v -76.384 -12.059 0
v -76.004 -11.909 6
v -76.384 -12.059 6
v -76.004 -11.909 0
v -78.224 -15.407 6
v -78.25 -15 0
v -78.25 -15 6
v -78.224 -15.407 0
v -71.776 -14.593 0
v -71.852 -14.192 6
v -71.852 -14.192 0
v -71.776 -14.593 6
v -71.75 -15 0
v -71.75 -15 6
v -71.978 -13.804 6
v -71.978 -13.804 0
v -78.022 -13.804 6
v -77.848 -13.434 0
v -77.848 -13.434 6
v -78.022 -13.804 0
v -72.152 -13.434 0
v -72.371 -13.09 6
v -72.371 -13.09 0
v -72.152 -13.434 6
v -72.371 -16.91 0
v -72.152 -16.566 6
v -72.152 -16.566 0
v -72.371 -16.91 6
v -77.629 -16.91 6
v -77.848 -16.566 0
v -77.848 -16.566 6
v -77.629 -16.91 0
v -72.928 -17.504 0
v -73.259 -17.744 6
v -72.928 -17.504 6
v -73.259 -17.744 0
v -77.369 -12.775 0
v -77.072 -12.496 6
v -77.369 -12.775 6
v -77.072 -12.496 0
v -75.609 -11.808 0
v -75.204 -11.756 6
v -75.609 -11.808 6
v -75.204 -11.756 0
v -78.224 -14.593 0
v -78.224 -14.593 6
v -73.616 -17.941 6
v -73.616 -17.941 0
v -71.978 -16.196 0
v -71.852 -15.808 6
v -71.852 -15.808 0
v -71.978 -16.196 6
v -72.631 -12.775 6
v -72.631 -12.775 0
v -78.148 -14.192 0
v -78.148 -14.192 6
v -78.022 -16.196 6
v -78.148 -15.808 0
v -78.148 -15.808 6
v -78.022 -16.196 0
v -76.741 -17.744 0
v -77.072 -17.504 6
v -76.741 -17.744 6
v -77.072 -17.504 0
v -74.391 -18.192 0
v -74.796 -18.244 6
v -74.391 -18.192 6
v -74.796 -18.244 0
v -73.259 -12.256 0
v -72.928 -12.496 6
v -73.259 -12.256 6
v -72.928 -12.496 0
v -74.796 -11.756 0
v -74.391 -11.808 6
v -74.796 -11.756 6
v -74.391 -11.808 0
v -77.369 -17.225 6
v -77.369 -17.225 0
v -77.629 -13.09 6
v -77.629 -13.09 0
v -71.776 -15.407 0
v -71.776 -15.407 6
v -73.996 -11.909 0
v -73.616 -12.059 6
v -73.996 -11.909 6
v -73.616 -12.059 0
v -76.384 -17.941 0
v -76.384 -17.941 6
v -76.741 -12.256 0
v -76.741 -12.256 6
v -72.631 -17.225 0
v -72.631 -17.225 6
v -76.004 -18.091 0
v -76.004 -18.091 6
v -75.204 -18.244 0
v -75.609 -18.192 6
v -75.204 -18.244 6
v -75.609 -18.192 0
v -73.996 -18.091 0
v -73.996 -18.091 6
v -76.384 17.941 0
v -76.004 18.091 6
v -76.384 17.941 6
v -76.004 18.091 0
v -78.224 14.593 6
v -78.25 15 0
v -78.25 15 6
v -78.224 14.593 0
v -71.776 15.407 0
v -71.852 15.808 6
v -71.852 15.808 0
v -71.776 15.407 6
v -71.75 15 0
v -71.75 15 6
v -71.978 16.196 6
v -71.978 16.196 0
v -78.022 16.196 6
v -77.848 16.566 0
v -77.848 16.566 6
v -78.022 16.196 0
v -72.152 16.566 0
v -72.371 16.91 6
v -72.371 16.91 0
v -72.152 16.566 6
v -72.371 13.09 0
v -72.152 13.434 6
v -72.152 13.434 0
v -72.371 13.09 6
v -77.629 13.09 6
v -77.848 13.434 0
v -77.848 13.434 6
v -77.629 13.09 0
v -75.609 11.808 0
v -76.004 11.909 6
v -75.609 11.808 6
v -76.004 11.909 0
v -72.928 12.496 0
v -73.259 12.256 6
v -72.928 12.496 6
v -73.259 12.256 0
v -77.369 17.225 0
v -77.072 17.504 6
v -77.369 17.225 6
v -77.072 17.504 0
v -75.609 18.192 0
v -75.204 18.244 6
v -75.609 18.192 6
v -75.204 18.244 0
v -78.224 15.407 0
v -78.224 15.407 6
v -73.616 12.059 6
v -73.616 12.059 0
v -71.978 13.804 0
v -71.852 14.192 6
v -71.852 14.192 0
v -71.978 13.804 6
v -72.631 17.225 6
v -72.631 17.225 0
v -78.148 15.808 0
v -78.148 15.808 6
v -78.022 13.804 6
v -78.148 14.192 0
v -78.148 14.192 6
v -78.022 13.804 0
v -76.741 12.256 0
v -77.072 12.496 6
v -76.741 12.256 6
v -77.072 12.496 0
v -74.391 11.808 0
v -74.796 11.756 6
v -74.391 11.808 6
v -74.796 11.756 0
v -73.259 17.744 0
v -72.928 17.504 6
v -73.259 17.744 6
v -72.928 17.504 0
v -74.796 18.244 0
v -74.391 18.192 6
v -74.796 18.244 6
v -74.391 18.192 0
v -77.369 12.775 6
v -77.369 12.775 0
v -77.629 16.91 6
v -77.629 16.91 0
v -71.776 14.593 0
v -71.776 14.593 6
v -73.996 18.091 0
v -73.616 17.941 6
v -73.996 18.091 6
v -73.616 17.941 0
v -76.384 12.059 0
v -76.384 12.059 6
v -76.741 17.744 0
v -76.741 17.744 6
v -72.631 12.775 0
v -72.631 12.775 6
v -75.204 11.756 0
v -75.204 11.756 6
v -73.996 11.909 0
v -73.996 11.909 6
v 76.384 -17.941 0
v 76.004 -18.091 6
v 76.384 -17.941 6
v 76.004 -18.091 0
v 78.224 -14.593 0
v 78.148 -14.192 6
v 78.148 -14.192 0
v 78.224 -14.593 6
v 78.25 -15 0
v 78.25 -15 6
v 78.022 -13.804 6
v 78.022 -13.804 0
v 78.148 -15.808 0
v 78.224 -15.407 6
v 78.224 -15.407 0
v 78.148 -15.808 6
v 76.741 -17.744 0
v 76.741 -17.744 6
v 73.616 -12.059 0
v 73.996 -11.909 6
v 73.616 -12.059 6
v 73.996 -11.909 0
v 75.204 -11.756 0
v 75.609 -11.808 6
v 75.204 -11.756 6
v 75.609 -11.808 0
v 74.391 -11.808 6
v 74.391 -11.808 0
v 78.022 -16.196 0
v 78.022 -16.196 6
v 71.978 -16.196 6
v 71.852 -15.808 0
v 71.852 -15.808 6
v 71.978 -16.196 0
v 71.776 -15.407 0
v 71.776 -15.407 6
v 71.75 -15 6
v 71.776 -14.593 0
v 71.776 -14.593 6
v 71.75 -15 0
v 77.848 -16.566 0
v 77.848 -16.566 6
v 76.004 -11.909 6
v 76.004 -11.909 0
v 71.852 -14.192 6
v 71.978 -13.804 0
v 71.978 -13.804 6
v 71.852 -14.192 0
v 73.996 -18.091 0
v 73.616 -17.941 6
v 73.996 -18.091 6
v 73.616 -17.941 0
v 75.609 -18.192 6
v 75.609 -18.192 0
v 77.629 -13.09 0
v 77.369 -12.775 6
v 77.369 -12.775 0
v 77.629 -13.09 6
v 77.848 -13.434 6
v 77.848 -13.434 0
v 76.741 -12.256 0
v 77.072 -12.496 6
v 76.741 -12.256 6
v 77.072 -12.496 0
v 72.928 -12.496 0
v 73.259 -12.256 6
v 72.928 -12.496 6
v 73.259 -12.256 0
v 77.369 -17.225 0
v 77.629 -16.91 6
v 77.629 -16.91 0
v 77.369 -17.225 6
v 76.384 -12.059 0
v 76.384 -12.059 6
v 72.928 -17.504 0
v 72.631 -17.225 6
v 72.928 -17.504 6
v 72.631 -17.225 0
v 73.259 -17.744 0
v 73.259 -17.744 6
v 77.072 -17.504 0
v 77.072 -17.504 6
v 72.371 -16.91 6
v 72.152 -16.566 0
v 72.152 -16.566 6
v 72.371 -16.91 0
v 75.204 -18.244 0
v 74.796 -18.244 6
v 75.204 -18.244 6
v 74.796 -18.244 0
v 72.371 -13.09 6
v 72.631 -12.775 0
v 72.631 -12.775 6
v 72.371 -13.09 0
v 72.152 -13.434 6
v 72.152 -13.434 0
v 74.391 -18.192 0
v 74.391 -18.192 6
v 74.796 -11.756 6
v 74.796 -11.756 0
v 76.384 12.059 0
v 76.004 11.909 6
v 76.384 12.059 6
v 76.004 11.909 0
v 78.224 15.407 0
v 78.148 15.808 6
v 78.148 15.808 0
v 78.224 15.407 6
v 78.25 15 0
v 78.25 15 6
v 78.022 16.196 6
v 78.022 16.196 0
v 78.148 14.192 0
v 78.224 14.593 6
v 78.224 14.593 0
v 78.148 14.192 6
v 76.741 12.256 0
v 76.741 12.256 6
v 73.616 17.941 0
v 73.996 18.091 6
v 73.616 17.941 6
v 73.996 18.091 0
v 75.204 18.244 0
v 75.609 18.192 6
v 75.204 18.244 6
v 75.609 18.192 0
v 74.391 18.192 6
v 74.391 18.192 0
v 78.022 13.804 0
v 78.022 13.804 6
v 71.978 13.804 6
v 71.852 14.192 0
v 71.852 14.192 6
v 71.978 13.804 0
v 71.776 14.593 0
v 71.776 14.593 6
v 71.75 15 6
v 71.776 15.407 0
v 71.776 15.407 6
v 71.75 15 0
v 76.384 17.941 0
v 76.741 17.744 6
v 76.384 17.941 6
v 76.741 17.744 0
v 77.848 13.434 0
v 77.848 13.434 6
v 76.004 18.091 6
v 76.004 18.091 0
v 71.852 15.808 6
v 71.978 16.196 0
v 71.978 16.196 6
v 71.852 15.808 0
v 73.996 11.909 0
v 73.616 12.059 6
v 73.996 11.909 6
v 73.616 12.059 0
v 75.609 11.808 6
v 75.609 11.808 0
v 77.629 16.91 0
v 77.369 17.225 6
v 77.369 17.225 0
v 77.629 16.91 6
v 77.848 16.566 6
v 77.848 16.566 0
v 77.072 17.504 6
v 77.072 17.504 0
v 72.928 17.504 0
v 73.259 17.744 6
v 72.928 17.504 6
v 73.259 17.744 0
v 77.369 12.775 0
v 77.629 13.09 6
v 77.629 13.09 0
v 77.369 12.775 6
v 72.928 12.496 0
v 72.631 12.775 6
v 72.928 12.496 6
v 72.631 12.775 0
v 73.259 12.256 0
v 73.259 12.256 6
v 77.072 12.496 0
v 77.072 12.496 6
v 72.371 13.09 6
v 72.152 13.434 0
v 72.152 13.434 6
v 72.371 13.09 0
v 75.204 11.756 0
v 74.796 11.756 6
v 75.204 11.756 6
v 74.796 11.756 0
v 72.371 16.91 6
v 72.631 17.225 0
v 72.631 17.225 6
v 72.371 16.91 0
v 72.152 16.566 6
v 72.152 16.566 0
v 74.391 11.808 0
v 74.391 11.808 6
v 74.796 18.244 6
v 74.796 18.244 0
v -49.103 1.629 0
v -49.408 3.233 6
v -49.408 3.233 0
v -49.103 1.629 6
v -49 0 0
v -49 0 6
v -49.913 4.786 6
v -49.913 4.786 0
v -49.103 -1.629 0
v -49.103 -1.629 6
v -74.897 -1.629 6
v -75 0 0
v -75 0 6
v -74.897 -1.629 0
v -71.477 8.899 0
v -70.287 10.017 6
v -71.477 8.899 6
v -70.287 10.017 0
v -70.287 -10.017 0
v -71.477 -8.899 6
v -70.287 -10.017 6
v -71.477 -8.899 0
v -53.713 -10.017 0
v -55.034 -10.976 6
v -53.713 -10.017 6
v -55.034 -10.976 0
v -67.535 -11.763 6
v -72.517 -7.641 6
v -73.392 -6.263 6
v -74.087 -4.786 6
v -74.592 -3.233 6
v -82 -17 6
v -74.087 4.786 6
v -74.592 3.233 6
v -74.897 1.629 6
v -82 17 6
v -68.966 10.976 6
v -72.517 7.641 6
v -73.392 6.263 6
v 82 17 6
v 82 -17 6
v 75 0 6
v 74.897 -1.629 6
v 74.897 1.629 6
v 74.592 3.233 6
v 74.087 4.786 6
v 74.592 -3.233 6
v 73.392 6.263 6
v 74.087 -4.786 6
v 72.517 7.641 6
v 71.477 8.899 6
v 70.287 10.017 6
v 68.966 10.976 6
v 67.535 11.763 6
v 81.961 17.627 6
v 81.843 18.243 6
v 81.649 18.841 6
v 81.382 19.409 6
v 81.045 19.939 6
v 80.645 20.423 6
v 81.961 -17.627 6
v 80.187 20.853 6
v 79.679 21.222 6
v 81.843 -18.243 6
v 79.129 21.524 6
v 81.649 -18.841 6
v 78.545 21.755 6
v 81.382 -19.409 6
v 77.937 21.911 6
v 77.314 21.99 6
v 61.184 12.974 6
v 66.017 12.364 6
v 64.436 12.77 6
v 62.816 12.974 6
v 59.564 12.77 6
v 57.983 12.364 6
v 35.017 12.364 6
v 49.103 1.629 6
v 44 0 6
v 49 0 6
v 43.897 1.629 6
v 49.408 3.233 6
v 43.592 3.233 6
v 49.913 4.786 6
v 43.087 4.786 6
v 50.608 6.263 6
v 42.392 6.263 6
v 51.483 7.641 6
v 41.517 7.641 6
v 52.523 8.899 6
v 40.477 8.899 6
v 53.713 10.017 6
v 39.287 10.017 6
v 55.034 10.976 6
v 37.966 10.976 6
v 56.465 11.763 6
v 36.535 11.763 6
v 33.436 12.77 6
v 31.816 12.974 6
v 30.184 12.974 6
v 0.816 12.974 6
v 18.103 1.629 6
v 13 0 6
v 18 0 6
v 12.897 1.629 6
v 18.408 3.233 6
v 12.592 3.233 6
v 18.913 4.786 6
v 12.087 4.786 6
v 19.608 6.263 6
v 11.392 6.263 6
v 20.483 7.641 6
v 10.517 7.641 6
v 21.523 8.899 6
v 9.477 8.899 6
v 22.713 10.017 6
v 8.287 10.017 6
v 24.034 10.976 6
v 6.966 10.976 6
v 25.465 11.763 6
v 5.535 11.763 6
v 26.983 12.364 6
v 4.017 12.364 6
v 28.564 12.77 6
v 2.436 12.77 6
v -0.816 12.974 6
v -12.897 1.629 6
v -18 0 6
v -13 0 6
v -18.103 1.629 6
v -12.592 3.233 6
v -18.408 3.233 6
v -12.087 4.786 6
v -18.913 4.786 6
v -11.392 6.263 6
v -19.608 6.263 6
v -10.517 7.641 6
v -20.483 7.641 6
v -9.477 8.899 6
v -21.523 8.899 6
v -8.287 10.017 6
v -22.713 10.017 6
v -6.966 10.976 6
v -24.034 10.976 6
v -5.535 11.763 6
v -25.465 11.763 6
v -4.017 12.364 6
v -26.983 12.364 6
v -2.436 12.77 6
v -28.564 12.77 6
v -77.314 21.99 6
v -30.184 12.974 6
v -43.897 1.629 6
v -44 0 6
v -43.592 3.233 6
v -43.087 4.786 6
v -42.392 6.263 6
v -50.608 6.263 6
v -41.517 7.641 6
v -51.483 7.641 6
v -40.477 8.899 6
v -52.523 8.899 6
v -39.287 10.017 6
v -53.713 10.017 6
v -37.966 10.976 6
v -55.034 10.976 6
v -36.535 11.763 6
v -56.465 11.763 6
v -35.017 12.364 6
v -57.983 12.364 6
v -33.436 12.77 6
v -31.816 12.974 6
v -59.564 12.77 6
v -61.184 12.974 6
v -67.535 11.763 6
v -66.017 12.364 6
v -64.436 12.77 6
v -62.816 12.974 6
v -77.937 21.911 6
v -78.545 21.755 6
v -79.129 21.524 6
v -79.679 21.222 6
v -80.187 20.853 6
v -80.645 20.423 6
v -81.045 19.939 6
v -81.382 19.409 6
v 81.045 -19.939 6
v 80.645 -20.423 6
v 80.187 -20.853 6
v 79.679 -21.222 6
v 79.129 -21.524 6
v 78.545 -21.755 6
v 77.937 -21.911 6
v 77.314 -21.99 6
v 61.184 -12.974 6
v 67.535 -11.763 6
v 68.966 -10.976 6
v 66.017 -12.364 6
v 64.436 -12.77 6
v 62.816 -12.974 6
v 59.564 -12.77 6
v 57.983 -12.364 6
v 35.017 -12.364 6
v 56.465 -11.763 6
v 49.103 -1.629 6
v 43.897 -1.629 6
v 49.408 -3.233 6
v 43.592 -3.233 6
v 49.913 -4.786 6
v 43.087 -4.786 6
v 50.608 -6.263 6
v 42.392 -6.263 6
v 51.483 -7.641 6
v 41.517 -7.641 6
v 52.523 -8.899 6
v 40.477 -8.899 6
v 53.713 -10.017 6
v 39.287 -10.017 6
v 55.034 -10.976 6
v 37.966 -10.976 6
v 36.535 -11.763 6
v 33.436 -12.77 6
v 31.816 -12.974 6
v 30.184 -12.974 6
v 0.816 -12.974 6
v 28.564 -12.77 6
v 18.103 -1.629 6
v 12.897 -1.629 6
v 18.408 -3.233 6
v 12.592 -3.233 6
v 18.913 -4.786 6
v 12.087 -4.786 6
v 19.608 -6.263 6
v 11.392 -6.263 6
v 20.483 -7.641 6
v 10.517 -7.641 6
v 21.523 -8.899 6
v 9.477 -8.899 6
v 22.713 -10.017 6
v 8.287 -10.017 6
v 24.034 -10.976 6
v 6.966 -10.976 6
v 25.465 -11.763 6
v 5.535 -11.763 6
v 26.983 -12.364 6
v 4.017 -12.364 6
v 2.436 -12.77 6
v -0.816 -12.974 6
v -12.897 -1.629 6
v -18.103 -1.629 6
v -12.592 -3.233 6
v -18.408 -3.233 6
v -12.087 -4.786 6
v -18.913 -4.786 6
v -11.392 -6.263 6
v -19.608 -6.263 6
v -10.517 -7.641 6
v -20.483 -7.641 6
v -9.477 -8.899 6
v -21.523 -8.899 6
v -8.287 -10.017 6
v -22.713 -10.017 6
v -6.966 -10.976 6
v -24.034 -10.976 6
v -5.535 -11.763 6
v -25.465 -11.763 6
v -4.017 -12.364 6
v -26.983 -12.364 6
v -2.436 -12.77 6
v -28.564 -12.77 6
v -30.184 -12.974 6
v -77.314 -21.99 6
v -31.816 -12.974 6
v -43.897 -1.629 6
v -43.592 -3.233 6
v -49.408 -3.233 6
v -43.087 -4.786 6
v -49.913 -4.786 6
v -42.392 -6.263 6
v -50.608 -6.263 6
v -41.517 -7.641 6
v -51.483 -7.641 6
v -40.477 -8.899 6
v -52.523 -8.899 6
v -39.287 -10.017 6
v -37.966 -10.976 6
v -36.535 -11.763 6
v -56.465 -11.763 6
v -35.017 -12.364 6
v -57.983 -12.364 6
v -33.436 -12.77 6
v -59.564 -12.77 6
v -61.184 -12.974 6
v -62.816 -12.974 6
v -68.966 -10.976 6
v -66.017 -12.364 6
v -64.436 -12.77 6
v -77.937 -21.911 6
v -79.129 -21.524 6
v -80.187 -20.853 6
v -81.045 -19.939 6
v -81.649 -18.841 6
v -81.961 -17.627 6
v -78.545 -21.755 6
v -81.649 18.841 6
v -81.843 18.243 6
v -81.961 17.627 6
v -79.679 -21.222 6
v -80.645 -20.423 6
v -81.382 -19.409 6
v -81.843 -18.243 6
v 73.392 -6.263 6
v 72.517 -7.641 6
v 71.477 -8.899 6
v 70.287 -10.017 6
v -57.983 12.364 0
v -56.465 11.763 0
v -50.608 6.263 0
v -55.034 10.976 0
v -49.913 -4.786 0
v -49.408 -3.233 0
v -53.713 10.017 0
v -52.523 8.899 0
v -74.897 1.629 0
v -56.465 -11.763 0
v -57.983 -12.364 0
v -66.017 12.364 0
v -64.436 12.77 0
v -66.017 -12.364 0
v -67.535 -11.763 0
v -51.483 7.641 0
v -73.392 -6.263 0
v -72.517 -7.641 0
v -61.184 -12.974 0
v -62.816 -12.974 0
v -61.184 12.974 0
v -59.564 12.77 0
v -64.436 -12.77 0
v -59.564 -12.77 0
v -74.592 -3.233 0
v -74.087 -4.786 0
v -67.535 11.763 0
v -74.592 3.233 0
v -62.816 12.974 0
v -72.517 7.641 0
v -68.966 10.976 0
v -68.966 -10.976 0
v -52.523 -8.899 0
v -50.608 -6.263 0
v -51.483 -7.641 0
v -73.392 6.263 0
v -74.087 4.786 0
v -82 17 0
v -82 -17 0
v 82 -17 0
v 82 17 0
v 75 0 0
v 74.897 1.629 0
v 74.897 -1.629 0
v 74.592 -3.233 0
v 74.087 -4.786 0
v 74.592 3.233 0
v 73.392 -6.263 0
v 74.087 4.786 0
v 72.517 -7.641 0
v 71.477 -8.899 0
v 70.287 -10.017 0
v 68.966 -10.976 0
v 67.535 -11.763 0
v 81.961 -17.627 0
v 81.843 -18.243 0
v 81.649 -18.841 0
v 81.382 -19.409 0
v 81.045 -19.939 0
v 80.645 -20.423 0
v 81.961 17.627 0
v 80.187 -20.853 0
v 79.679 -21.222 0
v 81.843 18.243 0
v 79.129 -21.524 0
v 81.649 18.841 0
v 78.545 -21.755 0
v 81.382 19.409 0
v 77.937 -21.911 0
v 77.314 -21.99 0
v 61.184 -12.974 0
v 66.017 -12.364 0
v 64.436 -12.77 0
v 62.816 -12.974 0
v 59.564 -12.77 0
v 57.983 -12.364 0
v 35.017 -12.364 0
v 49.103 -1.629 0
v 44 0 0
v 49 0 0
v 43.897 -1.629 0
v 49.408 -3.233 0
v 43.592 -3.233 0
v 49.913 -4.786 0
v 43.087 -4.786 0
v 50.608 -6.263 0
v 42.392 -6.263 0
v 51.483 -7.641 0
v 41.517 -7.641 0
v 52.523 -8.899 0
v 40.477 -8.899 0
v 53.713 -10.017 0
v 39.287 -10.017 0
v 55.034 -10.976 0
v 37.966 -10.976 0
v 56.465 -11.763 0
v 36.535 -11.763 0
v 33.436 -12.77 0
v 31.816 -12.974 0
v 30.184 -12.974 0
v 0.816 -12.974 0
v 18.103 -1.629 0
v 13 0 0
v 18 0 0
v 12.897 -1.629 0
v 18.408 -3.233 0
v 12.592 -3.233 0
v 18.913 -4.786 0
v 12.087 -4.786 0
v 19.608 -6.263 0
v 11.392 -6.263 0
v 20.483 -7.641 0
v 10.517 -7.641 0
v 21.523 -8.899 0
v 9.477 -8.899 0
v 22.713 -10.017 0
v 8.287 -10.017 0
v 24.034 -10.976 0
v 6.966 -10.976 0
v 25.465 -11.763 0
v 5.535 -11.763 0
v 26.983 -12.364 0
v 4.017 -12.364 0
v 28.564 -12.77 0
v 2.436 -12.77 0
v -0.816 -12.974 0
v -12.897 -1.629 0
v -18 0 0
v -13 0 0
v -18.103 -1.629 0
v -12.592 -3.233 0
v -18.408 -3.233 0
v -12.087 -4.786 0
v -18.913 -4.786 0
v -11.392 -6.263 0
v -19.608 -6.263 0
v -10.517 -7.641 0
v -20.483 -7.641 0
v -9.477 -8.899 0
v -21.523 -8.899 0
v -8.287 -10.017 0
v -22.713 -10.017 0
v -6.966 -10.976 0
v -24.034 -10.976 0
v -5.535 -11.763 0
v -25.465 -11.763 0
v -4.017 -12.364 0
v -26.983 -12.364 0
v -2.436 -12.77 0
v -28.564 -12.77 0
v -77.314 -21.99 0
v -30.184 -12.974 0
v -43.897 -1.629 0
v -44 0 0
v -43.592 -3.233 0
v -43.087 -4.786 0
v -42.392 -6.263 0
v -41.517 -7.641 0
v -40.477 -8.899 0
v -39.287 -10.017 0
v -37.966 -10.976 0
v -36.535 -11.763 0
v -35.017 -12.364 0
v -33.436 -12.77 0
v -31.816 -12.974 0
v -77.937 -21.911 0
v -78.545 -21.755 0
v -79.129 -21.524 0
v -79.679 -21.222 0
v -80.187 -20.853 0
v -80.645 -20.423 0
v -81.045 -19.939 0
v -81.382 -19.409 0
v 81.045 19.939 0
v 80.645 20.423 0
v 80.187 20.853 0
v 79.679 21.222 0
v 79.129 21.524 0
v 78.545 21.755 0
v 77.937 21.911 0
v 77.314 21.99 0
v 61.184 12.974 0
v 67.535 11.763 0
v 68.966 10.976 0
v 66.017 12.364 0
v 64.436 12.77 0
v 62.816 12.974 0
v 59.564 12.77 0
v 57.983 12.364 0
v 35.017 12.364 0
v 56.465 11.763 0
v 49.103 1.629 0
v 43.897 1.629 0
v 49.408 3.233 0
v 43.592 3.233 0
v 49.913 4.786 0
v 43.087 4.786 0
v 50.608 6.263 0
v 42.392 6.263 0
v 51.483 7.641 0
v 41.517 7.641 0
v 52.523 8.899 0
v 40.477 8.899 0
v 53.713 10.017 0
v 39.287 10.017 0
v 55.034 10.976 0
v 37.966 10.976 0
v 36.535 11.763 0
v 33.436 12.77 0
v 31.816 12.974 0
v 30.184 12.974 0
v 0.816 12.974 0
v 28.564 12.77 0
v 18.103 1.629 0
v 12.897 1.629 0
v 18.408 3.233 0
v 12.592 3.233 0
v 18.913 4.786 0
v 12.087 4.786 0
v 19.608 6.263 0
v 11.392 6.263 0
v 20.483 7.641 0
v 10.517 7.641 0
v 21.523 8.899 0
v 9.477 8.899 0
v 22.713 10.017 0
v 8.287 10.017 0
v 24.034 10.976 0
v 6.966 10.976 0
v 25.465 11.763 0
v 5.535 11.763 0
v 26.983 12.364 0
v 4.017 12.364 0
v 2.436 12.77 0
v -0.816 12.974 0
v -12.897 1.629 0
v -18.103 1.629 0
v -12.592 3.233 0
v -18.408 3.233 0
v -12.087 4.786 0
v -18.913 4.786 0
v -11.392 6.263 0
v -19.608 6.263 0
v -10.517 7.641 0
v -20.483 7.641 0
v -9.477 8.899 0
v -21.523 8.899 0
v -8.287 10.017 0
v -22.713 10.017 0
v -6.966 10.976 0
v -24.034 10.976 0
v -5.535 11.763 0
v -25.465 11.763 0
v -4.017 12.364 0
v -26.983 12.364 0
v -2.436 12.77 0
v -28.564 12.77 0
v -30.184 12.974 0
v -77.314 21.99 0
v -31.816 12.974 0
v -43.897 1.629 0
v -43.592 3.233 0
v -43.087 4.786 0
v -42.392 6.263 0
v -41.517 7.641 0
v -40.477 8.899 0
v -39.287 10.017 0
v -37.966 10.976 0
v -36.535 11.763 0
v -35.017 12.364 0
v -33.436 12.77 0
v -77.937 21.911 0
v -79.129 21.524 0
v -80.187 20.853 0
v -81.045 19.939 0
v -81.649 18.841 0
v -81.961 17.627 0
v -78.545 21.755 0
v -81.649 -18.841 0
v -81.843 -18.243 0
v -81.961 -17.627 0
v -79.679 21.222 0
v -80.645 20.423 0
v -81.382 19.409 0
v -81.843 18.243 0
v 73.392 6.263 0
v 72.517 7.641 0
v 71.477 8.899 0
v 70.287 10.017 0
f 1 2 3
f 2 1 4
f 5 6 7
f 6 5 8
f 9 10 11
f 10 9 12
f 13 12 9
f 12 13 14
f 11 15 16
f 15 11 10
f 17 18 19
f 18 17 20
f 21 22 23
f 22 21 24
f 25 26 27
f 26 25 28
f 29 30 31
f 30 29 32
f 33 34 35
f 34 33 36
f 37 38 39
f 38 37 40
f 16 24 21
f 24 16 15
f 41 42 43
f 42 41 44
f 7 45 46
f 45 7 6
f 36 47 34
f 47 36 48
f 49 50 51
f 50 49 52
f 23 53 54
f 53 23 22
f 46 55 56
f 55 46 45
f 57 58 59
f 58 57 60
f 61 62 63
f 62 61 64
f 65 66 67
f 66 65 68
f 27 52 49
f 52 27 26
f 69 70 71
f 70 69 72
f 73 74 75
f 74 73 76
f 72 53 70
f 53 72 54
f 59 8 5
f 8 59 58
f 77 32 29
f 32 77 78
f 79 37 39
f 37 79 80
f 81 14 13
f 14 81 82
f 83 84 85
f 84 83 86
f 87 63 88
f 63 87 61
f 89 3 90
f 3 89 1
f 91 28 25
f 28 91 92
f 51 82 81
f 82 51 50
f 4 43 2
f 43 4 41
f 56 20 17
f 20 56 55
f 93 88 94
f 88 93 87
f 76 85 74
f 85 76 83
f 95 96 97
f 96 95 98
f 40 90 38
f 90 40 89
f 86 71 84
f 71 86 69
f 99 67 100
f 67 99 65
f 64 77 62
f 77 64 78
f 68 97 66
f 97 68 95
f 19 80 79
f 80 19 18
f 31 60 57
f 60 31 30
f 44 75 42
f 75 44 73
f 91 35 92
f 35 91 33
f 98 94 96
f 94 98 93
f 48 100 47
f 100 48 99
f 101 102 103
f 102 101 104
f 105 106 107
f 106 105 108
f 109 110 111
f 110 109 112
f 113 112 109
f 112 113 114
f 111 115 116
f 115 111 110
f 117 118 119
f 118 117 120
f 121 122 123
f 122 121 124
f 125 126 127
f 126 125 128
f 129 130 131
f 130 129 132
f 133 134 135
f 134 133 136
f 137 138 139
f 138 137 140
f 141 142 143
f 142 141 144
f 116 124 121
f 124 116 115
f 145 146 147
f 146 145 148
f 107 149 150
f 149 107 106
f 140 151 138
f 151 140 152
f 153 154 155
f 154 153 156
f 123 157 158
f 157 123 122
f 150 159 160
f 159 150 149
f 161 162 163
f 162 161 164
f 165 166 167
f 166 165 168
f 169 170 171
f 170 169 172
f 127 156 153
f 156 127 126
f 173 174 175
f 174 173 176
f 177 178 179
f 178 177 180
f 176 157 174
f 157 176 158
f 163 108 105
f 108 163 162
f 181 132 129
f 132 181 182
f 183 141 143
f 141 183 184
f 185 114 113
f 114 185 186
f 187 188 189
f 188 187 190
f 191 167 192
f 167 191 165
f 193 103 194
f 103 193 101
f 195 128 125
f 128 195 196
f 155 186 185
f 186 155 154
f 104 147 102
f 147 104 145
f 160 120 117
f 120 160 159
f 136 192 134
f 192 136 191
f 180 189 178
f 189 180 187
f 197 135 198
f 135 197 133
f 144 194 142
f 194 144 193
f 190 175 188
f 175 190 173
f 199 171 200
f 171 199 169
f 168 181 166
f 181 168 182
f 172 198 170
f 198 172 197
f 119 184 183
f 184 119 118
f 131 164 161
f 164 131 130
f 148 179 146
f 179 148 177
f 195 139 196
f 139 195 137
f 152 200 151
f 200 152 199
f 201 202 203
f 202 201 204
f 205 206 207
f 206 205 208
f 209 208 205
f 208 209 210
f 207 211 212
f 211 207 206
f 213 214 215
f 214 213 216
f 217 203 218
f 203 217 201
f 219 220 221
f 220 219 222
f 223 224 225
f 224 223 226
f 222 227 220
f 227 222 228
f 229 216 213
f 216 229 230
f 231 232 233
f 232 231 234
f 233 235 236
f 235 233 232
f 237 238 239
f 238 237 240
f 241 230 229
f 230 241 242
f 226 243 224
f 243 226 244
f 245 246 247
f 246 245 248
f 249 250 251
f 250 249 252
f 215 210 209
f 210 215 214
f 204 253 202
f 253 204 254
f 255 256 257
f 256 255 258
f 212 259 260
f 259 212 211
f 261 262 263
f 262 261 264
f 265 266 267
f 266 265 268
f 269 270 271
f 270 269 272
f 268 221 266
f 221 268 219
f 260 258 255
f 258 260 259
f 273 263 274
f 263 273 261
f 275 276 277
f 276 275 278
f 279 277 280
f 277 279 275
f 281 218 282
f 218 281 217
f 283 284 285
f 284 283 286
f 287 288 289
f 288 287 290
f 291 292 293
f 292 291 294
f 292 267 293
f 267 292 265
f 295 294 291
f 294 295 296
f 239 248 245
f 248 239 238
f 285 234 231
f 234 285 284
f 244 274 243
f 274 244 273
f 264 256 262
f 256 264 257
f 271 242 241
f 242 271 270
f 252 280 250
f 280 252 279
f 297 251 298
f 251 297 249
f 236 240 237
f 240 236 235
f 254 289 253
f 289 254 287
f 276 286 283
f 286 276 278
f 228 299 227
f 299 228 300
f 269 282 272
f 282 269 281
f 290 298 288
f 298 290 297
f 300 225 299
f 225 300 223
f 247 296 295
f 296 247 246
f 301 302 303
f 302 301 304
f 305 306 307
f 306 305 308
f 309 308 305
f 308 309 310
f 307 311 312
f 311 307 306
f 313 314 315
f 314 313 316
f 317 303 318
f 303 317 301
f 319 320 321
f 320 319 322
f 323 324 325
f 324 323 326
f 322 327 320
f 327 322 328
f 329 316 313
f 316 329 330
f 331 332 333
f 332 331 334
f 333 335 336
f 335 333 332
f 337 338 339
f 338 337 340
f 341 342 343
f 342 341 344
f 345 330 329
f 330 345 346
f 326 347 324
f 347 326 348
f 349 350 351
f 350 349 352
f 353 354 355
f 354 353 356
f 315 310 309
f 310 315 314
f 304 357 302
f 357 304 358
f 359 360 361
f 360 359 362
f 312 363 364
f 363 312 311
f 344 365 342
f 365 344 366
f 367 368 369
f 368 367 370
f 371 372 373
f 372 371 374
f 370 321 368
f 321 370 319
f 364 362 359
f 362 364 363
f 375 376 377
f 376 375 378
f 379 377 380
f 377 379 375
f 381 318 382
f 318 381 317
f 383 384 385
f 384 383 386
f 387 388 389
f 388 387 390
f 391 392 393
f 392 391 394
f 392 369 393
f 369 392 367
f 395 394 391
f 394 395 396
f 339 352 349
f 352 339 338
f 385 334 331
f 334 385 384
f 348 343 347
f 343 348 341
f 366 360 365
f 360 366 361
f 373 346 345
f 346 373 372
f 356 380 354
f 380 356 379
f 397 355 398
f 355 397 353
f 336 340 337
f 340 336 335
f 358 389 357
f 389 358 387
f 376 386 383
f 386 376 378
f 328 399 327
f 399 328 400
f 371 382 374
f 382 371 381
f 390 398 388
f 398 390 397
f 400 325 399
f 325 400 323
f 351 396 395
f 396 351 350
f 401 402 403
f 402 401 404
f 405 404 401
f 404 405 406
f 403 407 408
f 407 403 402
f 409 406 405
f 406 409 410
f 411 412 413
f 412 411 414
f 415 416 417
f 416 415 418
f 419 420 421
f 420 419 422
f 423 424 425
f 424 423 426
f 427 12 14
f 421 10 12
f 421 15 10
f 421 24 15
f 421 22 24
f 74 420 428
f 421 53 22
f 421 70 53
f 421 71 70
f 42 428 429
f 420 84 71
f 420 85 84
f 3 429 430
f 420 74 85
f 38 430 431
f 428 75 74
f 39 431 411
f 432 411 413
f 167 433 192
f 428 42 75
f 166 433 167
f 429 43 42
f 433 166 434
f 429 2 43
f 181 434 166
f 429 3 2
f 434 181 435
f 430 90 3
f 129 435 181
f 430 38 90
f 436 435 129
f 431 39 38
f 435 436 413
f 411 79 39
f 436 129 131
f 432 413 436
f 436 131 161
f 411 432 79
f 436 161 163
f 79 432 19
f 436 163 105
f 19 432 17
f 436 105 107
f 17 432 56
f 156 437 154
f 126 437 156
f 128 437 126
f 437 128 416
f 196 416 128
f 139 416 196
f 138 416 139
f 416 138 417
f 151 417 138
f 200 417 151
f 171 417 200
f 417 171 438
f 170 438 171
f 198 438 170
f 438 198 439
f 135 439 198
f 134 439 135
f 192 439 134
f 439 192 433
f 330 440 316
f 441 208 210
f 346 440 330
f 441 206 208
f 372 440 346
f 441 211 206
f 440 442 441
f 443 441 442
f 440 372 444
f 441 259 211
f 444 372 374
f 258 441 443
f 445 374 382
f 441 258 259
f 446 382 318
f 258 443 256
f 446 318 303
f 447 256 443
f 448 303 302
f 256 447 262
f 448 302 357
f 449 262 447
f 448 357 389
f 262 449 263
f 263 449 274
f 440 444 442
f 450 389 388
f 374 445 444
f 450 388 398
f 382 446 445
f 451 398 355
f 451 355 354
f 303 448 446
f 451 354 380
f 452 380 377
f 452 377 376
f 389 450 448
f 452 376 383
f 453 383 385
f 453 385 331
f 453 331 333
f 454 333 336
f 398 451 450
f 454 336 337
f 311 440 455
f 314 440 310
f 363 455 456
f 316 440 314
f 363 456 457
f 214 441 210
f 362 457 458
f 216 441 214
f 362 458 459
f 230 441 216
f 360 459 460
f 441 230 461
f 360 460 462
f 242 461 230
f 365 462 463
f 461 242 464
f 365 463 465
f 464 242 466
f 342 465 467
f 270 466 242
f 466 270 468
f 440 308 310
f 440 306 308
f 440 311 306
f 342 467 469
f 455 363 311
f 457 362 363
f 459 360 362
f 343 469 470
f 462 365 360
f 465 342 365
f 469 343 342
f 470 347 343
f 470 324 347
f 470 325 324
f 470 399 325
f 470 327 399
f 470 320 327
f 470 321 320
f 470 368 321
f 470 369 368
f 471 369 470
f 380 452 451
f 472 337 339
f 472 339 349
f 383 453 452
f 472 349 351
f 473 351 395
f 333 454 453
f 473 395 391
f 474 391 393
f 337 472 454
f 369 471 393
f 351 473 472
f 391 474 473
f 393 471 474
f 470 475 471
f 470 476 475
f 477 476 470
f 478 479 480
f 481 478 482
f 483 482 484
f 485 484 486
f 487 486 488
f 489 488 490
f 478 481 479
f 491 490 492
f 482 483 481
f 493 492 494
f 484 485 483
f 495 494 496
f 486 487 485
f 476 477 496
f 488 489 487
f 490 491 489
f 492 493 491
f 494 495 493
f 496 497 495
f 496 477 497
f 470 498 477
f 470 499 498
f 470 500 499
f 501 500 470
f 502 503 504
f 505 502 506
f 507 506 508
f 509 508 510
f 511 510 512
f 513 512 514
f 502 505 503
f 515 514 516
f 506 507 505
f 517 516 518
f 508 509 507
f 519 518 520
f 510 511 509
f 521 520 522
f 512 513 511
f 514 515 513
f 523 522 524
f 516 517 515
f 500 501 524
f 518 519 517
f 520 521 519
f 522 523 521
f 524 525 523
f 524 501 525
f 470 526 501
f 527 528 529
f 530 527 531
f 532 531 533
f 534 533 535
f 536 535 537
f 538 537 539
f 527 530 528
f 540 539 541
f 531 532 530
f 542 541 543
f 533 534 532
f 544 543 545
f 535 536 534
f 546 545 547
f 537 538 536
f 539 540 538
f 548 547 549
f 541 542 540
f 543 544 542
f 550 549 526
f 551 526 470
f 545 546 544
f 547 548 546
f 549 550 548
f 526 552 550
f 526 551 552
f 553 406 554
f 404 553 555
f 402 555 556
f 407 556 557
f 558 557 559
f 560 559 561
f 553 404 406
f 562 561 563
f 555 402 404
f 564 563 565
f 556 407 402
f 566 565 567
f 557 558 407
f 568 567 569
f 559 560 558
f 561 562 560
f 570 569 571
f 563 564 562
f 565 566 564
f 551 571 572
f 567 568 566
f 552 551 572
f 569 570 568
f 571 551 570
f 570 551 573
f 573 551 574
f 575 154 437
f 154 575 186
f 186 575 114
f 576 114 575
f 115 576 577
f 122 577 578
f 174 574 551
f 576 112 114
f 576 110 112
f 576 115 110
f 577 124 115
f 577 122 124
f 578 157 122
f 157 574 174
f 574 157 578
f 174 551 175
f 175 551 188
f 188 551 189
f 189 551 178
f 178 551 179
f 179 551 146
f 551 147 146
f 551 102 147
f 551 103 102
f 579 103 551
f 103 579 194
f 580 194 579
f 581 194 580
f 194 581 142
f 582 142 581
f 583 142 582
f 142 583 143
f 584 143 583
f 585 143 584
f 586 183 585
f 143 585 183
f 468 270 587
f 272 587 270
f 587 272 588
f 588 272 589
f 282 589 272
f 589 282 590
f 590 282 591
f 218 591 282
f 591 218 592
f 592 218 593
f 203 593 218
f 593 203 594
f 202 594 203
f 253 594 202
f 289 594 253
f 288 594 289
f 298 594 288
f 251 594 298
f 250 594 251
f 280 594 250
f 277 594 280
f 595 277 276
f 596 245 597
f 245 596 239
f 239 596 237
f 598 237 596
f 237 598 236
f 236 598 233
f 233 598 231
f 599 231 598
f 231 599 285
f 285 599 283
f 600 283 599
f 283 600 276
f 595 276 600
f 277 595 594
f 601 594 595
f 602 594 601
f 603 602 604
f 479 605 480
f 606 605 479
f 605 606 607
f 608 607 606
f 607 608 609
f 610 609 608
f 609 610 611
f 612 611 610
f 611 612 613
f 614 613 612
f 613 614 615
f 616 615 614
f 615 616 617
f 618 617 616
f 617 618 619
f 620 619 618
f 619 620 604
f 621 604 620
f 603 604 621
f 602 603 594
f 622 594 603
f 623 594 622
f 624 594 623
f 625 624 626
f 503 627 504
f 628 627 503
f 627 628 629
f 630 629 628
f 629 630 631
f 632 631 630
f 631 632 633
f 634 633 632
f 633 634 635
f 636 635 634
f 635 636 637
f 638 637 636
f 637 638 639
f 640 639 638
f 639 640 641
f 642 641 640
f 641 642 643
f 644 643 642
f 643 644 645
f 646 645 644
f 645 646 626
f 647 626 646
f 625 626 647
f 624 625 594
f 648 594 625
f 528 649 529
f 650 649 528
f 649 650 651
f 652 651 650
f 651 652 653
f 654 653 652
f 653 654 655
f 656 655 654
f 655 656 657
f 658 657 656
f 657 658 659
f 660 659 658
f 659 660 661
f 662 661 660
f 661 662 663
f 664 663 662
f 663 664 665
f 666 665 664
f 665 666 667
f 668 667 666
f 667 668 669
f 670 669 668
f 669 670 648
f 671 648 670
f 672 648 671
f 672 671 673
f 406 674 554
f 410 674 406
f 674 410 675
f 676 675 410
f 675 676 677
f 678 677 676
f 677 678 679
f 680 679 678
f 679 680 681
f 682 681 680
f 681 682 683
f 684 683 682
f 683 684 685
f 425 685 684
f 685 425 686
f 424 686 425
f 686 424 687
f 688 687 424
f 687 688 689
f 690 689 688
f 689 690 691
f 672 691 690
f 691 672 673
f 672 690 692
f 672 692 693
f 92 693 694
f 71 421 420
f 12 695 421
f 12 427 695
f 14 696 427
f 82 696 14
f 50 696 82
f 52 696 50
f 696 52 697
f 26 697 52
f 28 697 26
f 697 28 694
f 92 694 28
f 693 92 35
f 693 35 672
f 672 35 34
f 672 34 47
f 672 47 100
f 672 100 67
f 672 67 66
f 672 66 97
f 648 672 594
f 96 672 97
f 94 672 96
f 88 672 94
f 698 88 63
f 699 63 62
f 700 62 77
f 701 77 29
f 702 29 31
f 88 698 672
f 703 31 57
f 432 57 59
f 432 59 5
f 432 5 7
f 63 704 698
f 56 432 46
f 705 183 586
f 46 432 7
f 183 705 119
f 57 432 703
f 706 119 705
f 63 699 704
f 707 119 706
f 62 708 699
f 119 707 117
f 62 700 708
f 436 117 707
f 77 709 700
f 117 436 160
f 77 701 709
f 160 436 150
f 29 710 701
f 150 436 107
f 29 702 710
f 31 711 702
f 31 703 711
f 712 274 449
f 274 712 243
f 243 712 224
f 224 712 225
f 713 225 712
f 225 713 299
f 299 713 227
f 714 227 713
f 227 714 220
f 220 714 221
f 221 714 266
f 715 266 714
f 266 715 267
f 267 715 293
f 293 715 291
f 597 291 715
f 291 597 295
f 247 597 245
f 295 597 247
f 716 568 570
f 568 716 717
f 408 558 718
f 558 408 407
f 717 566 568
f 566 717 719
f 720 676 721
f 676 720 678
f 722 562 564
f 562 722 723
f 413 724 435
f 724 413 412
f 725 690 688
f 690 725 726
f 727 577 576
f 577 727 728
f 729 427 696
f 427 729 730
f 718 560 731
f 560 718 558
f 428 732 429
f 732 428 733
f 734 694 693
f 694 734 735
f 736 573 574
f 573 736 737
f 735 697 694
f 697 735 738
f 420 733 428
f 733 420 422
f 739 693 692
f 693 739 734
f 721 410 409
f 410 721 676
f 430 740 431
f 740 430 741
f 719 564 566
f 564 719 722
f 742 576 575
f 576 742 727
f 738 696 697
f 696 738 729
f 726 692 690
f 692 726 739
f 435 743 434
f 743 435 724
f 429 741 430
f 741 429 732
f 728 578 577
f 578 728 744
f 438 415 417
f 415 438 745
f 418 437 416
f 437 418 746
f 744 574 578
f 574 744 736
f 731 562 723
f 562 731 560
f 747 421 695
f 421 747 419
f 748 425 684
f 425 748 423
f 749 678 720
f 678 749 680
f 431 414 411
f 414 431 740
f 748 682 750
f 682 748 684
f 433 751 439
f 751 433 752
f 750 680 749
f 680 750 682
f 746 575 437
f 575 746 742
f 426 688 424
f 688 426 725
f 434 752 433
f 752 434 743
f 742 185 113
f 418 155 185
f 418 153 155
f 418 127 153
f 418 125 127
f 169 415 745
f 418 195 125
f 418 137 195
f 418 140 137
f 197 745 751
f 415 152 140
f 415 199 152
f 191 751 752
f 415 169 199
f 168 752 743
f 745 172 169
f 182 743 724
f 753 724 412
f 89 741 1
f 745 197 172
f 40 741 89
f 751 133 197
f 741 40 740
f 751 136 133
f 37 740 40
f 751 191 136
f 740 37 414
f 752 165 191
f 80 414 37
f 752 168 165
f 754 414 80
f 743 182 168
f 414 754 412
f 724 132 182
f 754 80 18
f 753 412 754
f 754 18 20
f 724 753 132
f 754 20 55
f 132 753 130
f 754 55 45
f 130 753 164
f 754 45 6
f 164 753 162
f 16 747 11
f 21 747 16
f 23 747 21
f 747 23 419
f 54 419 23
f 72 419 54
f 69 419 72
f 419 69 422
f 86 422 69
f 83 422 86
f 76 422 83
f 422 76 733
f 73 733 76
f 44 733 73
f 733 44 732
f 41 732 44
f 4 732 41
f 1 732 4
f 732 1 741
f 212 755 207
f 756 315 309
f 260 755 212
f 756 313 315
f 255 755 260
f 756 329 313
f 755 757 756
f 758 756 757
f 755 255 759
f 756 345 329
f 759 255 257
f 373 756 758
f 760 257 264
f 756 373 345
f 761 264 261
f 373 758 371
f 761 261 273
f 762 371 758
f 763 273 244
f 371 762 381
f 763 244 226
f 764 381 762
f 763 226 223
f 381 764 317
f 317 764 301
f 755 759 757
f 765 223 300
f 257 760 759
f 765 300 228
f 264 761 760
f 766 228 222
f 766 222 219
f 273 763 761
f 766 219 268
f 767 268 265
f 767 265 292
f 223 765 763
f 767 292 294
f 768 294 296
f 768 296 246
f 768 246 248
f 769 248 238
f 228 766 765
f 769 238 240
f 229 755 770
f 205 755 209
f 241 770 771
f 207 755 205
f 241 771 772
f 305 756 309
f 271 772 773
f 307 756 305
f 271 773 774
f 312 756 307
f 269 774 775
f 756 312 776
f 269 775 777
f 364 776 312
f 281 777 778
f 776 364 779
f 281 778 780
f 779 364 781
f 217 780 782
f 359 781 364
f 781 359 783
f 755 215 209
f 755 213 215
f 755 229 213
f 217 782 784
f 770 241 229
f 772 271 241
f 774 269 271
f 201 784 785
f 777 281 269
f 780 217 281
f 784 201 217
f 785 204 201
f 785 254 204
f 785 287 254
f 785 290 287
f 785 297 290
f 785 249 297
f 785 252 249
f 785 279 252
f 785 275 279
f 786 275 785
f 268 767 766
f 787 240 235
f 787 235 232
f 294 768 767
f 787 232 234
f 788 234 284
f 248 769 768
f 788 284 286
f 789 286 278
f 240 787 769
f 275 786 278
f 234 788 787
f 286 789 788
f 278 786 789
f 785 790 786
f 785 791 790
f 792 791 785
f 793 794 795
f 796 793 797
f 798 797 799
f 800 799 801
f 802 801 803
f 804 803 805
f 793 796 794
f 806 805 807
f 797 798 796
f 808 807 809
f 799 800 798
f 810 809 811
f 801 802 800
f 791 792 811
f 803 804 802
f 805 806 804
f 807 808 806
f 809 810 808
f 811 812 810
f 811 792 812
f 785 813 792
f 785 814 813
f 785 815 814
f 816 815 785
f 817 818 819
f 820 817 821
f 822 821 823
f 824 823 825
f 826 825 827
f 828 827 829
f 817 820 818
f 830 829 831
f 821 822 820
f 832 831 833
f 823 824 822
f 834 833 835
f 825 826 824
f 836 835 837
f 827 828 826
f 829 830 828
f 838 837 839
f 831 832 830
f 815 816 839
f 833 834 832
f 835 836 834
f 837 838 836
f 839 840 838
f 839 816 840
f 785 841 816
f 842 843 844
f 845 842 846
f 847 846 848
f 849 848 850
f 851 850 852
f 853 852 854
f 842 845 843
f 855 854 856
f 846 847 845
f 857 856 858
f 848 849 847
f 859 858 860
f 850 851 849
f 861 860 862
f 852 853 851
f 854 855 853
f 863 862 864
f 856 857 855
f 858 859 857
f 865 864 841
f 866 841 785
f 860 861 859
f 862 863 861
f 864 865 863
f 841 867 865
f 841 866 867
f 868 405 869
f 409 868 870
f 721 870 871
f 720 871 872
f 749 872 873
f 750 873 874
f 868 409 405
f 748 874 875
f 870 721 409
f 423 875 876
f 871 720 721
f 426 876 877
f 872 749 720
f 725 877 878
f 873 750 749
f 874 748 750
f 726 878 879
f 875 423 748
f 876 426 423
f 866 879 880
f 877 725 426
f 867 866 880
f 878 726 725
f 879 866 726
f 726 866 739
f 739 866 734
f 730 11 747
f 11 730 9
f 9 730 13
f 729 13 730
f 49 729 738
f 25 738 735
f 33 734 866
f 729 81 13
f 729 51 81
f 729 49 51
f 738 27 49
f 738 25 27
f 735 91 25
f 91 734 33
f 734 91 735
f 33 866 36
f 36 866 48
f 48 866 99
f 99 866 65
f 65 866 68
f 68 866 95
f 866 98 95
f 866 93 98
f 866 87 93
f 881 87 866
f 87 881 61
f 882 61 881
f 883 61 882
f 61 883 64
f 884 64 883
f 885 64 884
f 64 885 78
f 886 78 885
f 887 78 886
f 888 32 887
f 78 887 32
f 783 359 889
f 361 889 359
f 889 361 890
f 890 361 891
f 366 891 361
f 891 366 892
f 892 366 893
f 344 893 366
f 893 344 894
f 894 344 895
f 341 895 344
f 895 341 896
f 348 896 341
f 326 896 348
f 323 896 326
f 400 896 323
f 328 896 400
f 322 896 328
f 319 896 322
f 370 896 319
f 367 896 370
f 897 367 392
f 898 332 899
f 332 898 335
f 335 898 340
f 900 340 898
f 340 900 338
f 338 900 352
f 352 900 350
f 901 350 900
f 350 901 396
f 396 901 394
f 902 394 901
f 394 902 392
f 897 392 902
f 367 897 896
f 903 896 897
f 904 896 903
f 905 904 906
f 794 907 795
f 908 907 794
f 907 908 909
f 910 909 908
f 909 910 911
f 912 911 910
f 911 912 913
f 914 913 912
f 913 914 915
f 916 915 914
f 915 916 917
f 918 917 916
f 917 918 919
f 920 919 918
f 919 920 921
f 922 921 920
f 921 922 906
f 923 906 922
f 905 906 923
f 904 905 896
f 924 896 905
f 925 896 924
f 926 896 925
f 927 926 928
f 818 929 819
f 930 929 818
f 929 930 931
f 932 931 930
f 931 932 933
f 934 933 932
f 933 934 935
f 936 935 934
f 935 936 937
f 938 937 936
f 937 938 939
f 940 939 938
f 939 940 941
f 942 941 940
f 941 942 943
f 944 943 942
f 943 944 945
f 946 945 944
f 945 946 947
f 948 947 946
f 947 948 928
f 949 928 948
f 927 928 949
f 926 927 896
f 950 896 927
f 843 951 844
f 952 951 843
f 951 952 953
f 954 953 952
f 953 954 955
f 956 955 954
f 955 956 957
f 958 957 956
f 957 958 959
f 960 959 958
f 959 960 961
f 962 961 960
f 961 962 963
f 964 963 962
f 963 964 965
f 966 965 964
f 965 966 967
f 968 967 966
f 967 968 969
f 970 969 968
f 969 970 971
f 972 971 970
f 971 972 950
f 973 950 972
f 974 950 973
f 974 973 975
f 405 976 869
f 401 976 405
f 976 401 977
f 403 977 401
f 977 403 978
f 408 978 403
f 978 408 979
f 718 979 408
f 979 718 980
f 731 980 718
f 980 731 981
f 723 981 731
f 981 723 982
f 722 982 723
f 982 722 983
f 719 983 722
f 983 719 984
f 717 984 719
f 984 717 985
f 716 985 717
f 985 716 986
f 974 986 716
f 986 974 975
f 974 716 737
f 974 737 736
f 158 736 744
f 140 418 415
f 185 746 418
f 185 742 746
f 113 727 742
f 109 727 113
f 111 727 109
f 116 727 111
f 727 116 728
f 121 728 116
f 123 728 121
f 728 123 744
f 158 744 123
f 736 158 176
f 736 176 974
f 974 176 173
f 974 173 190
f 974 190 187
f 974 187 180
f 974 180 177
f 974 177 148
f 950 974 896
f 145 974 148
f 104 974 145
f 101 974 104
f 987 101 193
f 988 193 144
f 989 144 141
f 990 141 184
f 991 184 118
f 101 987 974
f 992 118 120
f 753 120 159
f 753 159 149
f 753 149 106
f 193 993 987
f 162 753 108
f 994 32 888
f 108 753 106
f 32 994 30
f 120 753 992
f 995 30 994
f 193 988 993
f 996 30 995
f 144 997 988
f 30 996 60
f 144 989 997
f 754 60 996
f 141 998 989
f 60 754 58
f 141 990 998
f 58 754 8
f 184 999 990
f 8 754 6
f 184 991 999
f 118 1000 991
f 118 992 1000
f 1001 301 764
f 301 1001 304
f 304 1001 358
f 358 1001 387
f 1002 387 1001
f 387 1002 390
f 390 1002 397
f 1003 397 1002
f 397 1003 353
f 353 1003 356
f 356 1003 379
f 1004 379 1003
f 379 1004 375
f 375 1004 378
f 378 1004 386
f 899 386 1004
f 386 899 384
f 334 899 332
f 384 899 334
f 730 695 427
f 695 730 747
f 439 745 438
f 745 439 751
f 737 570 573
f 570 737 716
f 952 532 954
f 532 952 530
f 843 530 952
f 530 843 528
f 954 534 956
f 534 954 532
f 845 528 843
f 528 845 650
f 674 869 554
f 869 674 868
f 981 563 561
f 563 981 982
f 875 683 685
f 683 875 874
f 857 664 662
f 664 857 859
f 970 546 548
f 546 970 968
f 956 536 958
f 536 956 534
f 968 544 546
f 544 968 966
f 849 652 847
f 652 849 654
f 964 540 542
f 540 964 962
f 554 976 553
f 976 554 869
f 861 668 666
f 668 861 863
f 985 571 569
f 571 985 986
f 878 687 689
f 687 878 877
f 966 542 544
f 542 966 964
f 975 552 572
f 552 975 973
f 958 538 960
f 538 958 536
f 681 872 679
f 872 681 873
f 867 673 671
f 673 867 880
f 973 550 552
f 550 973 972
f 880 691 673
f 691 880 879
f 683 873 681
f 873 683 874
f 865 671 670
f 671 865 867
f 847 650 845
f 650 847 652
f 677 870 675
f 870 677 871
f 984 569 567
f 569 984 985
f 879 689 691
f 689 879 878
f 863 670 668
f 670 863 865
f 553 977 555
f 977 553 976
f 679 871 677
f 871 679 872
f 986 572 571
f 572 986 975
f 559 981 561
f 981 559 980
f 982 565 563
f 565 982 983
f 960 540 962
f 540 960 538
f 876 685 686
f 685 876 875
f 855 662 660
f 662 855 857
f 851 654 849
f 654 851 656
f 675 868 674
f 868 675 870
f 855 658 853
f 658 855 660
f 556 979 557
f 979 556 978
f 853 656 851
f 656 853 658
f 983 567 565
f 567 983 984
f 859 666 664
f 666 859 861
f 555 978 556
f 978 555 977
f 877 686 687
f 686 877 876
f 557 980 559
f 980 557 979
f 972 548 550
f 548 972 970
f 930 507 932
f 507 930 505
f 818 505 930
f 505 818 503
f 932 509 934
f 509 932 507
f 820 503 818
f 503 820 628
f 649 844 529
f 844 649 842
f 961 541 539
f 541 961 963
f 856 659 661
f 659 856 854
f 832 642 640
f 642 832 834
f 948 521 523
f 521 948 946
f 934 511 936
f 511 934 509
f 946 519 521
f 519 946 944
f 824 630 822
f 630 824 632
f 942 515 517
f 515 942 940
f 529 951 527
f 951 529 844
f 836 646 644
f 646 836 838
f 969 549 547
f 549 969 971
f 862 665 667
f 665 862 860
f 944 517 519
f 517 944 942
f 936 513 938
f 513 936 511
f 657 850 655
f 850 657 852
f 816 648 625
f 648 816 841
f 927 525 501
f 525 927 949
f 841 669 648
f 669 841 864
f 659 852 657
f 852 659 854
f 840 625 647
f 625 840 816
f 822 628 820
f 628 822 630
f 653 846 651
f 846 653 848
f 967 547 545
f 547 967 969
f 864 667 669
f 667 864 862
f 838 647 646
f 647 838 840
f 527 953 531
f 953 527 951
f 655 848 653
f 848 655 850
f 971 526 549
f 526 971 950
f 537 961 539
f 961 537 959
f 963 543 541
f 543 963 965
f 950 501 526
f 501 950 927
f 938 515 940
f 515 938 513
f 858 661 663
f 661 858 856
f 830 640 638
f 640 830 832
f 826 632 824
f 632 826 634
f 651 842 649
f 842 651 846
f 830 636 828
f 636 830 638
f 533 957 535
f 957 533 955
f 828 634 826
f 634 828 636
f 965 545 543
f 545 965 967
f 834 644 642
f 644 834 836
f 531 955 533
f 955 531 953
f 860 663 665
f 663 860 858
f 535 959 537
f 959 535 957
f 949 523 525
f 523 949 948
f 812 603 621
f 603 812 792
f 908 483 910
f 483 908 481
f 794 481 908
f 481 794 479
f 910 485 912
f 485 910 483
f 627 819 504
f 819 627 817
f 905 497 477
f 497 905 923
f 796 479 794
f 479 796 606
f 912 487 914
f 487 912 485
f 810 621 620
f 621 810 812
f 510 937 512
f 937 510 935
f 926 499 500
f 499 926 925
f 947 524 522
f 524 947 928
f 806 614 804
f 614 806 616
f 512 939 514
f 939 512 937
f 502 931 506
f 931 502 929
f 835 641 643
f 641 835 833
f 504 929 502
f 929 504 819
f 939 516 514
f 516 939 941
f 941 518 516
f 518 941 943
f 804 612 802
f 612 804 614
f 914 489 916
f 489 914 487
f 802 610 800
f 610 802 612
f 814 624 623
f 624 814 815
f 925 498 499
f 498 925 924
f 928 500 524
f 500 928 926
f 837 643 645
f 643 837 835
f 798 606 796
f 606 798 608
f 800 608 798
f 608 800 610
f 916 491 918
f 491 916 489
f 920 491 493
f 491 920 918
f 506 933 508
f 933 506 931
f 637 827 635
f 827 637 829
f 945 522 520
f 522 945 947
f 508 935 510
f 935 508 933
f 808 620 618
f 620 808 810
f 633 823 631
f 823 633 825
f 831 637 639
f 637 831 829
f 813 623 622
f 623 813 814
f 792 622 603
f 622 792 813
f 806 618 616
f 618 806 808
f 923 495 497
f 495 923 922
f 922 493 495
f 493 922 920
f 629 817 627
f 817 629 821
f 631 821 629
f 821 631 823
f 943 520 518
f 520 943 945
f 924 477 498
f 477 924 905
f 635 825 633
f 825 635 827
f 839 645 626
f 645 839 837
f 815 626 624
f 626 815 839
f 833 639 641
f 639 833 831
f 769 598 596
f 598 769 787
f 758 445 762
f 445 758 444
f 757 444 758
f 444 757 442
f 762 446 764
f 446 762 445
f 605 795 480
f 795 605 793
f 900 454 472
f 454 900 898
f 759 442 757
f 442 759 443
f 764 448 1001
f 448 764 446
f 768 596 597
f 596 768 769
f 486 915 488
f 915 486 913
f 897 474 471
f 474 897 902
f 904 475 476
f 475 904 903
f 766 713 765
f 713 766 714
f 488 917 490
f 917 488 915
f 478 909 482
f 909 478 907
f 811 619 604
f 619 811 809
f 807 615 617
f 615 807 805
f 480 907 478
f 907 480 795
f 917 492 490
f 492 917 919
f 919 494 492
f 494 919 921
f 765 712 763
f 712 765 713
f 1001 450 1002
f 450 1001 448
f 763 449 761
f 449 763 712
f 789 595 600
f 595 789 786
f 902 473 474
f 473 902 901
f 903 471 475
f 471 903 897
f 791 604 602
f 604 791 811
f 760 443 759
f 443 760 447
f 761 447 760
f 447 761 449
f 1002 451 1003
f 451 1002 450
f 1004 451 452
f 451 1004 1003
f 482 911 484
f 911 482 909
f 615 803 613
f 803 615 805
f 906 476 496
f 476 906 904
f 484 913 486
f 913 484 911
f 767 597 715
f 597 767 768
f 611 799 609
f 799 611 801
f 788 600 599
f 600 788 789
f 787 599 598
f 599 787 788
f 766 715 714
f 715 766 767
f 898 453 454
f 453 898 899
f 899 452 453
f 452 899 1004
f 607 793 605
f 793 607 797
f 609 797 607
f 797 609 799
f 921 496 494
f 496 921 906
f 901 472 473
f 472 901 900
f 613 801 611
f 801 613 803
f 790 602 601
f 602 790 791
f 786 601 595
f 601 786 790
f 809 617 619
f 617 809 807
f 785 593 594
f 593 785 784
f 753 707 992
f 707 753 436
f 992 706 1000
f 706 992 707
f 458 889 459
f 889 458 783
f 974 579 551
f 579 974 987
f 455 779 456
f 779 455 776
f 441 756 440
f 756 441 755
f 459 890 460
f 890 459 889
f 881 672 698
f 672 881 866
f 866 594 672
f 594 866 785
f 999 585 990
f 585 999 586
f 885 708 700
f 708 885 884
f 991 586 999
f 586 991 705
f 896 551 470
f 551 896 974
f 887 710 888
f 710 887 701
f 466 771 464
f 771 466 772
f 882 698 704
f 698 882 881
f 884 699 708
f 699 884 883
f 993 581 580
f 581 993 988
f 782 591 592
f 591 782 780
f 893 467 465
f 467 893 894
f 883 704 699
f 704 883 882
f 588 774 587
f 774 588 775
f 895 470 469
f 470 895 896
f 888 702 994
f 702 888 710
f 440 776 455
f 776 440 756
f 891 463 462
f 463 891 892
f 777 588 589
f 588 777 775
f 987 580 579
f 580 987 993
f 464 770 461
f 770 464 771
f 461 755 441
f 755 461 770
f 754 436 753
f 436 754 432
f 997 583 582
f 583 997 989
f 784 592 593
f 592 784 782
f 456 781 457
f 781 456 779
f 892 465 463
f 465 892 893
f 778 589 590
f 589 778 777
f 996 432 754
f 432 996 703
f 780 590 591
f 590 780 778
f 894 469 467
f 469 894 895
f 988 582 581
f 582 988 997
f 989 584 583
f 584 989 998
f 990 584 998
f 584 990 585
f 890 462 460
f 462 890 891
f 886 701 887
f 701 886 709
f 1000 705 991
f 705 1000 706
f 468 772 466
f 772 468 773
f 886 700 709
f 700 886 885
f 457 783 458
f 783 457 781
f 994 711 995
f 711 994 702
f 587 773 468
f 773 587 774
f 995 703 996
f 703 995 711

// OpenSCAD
$fn = 50;


difference() {
	union() {
		hull() {
			translate(v = [-77.0000000000, 17.0000000000, 0]) {
				cylinder(h = 6, r = 5);
			}
			translate(v = [77.0000000000, 17.0000000000, 0]) {
				cylinder(h = 6, r = 5);
			}
			translate(v = [-77.0000000000, -17.0000000000, 0]) {
				cylinder(h = 6, r = 5);
			}
			translate(v = [77.0000000000, -17.0000000000, 0]) {
				cylinder(h = 6, r = 5);
			}
		}
	}
	union() {
		#translate(v = [-75.0000000000, -15.0000000000, -100.0000000000]) {
			cylinder(h = 200, r = 3.2500000000);
		}
		#translate(v = [-75.0000000000, 15.0000000000, -100.0000000000]) {
			cylinder(h = 200, r = 3.2500000000);
		}
		#translate(v = [75.0000000000, -15.0000000000, -100.0000000000]) {
			cylinder(h = 200, r = 3.2500000000);
		}
		#translate(v = [75.0000000000, 15.0000000000, -100.0000000000]) {
			cylinder(h = 200, r = 3.2500000000);
		}
		#translate(v = [-62.0000000000, 0, 0]) {
			cylinder(h = 6, r = 13.0000000000);
		}
		#translate(v = [-31.0000000000, 0, 0]) {
			cylinder(h = 6, r = 13.0000000000);
		}
		#cylinder(h = 6, r = 13.0000000000);
		#translate(v = [31.0000000000, 0, 0]) {
			cylinder(h = 6, r = 13.0000000000);
		}
		#translate(v = [62.0000000000, 0, 0]) {
			cylinder(h = 6, r = 13.0000000000);
		}
	}
}
